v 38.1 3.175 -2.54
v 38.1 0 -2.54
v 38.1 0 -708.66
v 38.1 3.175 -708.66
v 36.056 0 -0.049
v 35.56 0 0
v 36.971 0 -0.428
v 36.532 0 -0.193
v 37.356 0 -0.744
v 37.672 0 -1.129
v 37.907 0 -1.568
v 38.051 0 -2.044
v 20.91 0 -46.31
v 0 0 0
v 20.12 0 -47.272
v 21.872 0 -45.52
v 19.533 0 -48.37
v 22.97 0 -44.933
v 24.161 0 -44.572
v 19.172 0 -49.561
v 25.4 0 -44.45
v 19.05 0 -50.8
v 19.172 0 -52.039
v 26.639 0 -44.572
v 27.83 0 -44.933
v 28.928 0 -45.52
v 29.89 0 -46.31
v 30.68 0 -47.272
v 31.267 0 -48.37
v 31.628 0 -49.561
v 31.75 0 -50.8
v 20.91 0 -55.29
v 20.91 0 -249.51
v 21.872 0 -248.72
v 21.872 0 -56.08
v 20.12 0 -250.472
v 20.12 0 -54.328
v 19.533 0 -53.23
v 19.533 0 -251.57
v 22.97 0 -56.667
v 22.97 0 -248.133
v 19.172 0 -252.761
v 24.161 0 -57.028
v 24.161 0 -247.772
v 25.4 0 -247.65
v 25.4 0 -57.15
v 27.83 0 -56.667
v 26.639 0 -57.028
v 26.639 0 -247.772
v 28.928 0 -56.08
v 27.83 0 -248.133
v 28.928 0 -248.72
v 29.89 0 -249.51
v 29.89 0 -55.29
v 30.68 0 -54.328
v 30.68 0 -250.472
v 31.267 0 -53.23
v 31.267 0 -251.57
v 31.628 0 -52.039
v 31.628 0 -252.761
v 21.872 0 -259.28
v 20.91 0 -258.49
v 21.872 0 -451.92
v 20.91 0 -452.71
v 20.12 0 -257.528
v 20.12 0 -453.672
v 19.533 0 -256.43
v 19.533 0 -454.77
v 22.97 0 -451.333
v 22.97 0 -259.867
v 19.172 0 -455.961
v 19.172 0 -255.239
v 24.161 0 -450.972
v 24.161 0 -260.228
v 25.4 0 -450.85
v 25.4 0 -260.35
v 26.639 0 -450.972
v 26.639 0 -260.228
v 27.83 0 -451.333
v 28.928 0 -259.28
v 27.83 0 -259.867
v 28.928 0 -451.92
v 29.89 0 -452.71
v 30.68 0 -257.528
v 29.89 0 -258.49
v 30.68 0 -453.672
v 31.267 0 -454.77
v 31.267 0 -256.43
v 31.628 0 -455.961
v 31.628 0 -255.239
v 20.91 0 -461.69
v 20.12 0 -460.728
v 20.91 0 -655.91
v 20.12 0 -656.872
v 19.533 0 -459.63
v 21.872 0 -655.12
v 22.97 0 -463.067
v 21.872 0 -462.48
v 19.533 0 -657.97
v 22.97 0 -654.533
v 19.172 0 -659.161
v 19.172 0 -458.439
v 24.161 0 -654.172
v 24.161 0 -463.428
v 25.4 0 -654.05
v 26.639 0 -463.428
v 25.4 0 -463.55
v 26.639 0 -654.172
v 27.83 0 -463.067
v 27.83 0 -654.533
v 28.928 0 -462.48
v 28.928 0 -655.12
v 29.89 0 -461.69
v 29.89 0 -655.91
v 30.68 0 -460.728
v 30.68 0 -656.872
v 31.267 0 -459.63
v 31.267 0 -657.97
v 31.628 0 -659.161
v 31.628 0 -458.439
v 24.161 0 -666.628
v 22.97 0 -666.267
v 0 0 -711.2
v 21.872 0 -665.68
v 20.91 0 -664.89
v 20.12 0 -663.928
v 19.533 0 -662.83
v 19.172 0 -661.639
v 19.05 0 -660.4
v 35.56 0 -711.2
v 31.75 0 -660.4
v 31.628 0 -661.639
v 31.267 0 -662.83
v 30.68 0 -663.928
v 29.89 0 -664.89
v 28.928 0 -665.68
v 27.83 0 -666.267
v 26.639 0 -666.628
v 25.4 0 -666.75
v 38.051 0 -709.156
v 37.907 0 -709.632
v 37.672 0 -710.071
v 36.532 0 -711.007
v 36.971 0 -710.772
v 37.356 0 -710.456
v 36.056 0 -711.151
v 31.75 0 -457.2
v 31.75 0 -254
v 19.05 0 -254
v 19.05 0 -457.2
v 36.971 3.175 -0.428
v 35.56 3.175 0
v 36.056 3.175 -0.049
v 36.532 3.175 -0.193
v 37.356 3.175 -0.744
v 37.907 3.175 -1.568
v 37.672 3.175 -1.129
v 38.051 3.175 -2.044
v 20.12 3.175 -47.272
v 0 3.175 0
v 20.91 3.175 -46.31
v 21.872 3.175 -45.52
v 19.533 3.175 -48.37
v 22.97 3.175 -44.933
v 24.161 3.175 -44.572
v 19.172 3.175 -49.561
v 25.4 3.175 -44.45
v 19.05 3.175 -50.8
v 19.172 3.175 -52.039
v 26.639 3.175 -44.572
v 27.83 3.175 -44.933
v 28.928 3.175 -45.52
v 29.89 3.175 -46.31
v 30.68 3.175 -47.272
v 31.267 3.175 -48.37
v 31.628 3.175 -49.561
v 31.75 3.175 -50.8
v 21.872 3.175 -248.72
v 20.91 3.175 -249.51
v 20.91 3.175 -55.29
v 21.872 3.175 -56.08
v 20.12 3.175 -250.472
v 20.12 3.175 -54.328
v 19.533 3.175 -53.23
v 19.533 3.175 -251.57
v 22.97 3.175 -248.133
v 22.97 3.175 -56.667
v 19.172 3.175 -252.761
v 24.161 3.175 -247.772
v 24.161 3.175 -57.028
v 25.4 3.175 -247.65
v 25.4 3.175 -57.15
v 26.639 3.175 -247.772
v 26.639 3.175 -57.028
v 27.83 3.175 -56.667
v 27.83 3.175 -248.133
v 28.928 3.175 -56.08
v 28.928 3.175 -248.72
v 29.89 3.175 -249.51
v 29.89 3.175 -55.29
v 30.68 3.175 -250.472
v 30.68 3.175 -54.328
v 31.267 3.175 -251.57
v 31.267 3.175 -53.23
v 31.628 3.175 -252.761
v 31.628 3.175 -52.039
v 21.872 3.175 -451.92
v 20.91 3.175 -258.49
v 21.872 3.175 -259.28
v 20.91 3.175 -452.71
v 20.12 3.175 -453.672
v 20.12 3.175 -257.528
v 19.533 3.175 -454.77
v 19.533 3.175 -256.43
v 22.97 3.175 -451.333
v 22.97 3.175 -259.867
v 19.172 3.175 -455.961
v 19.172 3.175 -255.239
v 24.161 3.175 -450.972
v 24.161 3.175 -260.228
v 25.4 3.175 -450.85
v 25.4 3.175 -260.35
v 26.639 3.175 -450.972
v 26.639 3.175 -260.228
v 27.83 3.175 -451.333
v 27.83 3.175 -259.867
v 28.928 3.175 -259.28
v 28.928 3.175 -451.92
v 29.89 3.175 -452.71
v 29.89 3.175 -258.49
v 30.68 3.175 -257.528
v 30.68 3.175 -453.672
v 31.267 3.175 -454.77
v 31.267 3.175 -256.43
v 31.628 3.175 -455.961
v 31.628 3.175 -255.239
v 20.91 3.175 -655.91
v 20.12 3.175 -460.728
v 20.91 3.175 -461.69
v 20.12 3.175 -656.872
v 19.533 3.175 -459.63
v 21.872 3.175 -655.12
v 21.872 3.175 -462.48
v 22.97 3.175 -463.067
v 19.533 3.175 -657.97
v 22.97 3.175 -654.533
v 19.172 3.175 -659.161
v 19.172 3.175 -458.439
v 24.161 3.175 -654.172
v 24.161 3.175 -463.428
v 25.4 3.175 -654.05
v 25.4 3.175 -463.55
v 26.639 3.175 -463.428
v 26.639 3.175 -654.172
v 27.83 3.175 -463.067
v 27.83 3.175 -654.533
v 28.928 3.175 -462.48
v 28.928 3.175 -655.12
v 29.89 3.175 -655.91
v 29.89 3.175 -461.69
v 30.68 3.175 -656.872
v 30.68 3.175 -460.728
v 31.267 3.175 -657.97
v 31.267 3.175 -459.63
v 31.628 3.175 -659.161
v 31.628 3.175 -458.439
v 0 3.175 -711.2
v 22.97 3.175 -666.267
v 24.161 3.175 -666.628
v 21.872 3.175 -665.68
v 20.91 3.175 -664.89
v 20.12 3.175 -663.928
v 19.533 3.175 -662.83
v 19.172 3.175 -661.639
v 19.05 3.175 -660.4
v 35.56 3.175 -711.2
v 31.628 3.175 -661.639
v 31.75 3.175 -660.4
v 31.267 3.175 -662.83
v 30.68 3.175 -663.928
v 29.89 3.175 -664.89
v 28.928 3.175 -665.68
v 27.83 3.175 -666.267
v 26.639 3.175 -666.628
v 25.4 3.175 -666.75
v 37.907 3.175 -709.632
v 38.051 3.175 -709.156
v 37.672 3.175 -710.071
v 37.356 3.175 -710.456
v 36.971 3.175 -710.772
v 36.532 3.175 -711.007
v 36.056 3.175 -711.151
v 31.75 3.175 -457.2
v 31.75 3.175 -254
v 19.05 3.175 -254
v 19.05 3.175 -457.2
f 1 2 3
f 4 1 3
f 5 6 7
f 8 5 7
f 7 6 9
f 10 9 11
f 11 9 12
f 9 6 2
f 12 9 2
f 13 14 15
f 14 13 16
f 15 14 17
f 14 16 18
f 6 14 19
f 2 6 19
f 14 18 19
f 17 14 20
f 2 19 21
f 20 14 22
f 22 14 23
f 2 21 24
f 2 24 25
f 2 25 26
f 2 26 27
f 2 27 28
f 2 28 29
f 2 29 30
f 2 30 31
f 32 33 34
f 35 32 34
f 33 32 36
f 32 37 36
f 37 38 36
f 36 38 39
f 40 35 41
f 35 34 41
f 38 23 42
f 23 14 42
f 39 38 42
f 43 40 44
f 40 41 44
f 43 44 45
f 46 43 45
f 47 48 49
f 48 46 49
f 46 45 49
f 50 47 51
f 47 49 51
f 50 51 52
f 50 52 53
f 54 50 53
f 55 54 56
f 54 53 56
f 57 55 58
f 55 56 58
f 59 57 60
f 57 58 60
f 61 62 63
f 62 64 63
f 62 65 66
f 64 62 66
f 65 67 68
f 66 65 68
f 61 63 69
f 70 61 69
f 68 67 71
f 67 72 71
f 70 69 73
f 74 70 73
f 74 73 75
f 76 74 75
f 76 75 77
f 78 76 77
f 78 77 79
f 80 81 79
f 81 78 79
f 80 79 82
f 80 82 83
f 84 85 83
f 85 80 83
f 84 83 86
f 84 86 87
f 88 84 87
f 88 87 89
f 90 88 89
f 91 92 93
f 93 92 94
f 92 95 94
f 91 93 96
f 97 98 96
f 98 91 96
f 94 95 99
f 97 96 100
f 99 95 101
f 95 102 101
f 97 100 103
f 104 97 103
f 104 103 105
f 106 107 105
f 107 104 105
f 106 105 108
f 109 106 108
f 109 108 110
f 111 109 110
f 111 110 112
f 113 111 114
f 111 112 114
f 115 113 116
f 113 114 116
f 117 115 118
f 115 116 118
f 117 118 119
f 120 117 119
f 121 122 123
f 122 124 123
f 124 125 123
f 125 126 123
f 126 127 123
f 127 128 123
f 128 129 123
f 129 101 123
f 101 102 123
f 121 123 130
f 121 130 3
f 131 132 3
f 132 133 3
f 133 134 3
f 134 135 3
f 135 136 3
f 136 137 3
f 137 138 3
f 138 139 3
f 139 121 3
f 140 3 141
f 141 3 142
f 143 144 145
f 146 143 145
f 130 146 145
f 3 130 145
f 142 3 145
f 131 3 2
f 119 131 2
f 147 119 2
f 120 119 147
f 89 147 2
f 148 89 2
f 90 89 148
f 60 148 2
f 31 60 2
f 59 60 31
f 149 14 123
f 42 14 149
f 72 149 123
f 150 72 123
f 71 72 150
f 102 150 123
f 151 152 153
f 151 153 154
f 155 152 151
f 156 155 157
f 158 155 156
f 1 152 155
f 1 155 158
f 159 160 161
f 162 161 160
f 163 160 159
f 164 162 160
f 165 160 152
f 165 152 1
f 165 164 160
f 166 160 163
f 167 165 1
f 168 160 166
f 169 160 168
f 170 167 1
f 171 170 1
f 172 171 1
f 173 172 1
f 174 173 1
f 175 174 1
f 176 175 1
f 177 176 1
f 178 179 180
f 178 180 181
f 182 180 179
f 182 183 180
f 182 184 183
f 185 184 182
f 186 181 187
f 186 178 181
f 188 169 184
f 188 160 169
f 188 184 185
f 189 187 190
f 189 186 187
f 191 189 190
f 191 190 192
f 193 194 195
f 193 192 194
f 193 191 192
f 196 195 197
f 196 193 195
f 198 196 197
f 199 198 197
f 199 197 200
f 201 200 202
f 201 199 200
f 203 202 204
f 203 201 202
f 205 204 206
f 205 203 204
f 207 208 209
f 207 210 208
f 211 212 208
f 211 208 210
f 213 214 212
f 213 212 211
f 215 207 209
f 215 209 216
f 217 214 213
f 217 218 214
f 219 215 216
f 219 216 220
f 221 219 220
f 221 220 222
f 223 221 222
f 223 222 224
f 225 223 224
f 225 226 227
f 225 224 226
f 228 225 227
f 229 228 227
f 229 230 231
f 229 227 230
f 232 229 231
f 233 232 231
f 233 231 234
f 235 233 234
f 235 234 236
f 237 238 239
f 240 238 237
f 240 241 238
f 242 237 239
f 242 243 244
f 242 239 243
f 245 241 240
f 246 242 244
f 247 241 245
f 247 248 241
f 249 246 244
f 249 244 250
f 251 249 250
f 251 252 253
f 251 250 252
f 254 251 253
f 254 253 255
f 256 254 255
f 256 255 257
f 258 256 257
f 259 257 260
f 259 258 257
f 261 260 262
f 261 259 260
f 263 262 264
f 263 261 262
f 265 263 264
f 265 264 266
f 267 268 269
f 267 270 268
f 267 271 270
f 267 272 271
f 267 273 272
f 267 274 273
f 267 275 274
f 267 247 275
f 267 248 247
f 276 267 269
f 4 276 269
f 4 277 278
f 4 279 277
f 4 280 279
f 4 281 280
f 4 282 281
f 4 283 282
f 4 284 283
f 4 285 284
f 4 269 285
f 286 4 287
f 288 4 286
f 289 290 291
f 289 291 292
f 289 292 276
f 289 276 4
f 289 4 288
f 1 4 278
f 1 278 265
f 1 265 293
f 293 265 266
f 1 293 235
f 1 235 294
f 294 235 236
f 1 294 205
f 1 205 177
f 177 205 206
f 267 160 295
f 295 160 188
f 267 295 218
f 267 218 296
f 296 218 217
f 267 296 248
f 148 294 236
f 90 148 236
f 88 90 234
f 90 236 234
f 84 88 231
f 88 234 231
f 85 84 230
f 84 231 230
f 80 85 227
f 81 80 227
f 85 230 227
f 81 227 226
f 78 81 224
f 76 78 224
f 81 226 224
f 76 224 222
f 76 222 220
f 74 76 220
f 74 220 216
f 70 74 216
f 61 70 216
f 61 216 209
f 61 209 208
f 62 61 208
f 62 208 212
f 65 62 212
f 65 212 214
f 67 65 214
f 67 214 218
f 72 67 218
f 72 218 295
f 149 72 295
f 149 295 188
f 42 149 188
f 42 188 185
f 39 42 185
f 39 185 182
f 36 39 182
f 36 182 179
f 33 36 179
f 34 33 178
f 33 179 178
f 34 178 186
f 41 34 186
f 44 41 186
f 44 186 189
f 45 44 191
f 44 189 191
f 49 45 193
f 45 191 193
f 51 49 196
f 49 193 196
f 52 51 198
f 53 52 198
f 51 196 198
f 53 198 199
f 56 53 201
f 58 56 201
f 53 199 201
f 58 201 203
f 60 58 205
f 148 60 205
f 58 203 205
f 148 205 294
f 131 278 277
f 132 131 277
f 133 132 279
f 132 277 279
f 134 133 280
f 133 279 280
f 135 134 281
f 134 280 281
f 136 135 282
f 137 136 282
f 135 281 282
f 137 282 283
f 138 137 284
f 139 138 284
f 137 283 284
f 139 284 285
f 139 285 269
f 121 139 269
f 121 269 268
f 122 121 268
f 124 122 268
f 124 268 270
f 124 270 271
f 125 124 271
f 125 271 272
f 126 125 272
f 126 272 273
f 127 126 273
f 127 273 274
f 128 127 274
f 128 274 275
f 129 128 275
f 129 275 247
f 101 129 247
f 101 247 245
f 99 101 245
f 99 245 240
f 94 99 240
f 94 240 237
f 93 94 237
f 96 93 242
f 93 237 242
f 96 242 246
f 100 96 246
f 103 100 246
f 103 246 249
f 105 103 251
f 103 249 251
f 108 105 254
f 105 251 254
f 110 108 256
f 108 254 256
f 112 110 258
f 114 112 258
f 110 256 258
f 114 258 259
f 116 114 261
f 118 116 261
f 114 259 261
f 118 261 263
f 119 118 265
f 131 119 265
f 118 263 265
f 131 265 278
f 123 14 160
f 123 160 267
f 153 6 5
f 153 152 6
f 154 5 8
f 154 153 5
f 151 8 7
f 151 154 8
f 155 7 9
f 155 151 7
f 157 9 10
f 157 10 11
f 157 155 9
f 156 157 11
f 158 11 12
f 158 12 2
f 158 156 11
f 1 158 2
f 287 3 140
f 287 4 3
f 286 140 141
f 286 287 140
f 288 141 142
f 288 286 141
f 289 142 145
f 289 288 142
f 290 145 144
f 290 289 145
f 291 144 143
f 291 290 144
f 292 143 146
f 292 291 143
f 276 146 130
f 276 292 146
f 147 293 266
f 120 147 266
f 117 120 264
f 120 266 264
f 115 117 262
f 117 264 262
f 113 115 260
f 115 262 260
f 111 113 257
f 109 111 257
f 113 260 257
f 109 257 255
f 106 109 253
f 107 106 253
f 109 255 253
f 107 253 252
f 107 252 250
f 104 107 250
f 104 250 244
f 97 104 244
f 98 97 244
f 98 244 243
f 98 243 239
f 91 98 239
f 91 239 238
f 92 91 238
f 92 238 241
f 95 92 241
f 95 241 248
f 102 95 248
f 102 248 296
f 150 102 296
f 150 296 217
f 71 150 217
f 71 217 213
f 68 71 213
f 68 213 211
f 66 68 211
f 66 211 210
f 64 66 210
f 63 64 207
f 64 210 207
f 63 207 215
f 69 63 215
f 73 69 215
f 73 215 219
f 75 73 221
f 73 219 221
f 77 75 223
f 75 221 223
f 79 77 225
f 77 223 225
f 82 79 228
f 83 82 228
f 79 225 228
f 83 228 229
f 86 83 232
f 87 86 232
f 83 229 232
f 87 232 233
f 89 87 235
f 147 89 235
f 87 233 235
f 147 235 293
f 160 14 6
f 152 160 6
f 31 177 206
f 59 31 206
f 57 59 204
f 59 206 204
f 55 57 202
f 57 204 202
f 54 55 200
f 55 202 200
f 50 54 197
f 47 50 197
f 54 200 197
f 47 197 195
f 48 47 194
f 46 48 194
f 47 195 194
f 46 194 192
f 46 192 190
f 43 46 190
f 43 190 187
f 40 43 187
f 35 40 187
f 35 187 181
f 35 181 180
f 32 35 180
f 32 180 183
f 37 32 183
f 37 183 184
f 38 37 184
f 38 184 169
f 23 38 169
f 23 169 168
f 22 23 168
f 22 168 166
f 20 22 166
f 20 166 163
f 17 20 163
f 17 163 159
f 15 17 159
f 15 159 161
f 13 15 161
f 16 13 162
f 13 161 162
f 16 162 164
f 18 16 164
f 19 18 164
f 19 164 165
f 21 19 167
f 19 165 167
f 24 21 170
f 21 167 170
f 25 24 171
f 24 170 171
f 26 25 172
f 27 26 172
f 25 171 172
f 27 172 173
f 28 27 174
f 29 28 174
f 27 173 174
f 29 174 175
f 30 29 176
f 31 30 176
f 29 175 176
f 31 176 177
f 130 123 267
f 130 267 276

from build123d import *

# Parameters (mm, degrees)
SKETCH1_W           = 38.1
SKETCH1_H           = 711.2
BOSS_EXTRUDE1_DEPTH = 3.175
FILLET1_R           = 2.54
SKETCH2_R           = 6.35
CUT_EXTRUDE1_DEPTH  = 4.175


with BuildPart() as part:
    # Sketch1 → Boss-Extrude1 (new body)
    with BuildSketch(Plane(origin=(0, 0, 0), x_dir=(1, 0, 0), z_dir=(0, 1, 0))):
        with Locations((19.05, 355.6)):
            Rectangle(SKETCH1_W, SKETCH1_H)
    extrude(amount=BOSS_EXTRUDE1_DEPTH)

    # Fillet1
    fillet1_edges = [part.edges().sort_by_distance(p)[0] for p in [
        (38.1, 1.5875, -711.2),
        (38.1, 1.5875, 0),
    ]]
    fillet(fillet1_edges, radius=FILLET1_R)

    # Sketch2 → Cut-Extrude1 (cut, through all)
    with BuildSketch(Plane(origin=(0, 3.175, 0), x_dir=(1, 0, 0), z_dir=(0, 1, 0))):
        with Locations((25.4, 660.4)):
            Circle(SKETCH2_R)
        with Locations((25.4, 457.2)):
            Circle(SKETCH2_R)
        with Locations((25.4, 254)):
            Circle(SKETCH2_R)
        with Locations((25.4, 50.8)):
            Circle(SKETCH2_R)
    extrude(amount=-CUT_EXTRUDE1_DEPTH, mode=Mode.SUBTRACT)


solid = part.part
